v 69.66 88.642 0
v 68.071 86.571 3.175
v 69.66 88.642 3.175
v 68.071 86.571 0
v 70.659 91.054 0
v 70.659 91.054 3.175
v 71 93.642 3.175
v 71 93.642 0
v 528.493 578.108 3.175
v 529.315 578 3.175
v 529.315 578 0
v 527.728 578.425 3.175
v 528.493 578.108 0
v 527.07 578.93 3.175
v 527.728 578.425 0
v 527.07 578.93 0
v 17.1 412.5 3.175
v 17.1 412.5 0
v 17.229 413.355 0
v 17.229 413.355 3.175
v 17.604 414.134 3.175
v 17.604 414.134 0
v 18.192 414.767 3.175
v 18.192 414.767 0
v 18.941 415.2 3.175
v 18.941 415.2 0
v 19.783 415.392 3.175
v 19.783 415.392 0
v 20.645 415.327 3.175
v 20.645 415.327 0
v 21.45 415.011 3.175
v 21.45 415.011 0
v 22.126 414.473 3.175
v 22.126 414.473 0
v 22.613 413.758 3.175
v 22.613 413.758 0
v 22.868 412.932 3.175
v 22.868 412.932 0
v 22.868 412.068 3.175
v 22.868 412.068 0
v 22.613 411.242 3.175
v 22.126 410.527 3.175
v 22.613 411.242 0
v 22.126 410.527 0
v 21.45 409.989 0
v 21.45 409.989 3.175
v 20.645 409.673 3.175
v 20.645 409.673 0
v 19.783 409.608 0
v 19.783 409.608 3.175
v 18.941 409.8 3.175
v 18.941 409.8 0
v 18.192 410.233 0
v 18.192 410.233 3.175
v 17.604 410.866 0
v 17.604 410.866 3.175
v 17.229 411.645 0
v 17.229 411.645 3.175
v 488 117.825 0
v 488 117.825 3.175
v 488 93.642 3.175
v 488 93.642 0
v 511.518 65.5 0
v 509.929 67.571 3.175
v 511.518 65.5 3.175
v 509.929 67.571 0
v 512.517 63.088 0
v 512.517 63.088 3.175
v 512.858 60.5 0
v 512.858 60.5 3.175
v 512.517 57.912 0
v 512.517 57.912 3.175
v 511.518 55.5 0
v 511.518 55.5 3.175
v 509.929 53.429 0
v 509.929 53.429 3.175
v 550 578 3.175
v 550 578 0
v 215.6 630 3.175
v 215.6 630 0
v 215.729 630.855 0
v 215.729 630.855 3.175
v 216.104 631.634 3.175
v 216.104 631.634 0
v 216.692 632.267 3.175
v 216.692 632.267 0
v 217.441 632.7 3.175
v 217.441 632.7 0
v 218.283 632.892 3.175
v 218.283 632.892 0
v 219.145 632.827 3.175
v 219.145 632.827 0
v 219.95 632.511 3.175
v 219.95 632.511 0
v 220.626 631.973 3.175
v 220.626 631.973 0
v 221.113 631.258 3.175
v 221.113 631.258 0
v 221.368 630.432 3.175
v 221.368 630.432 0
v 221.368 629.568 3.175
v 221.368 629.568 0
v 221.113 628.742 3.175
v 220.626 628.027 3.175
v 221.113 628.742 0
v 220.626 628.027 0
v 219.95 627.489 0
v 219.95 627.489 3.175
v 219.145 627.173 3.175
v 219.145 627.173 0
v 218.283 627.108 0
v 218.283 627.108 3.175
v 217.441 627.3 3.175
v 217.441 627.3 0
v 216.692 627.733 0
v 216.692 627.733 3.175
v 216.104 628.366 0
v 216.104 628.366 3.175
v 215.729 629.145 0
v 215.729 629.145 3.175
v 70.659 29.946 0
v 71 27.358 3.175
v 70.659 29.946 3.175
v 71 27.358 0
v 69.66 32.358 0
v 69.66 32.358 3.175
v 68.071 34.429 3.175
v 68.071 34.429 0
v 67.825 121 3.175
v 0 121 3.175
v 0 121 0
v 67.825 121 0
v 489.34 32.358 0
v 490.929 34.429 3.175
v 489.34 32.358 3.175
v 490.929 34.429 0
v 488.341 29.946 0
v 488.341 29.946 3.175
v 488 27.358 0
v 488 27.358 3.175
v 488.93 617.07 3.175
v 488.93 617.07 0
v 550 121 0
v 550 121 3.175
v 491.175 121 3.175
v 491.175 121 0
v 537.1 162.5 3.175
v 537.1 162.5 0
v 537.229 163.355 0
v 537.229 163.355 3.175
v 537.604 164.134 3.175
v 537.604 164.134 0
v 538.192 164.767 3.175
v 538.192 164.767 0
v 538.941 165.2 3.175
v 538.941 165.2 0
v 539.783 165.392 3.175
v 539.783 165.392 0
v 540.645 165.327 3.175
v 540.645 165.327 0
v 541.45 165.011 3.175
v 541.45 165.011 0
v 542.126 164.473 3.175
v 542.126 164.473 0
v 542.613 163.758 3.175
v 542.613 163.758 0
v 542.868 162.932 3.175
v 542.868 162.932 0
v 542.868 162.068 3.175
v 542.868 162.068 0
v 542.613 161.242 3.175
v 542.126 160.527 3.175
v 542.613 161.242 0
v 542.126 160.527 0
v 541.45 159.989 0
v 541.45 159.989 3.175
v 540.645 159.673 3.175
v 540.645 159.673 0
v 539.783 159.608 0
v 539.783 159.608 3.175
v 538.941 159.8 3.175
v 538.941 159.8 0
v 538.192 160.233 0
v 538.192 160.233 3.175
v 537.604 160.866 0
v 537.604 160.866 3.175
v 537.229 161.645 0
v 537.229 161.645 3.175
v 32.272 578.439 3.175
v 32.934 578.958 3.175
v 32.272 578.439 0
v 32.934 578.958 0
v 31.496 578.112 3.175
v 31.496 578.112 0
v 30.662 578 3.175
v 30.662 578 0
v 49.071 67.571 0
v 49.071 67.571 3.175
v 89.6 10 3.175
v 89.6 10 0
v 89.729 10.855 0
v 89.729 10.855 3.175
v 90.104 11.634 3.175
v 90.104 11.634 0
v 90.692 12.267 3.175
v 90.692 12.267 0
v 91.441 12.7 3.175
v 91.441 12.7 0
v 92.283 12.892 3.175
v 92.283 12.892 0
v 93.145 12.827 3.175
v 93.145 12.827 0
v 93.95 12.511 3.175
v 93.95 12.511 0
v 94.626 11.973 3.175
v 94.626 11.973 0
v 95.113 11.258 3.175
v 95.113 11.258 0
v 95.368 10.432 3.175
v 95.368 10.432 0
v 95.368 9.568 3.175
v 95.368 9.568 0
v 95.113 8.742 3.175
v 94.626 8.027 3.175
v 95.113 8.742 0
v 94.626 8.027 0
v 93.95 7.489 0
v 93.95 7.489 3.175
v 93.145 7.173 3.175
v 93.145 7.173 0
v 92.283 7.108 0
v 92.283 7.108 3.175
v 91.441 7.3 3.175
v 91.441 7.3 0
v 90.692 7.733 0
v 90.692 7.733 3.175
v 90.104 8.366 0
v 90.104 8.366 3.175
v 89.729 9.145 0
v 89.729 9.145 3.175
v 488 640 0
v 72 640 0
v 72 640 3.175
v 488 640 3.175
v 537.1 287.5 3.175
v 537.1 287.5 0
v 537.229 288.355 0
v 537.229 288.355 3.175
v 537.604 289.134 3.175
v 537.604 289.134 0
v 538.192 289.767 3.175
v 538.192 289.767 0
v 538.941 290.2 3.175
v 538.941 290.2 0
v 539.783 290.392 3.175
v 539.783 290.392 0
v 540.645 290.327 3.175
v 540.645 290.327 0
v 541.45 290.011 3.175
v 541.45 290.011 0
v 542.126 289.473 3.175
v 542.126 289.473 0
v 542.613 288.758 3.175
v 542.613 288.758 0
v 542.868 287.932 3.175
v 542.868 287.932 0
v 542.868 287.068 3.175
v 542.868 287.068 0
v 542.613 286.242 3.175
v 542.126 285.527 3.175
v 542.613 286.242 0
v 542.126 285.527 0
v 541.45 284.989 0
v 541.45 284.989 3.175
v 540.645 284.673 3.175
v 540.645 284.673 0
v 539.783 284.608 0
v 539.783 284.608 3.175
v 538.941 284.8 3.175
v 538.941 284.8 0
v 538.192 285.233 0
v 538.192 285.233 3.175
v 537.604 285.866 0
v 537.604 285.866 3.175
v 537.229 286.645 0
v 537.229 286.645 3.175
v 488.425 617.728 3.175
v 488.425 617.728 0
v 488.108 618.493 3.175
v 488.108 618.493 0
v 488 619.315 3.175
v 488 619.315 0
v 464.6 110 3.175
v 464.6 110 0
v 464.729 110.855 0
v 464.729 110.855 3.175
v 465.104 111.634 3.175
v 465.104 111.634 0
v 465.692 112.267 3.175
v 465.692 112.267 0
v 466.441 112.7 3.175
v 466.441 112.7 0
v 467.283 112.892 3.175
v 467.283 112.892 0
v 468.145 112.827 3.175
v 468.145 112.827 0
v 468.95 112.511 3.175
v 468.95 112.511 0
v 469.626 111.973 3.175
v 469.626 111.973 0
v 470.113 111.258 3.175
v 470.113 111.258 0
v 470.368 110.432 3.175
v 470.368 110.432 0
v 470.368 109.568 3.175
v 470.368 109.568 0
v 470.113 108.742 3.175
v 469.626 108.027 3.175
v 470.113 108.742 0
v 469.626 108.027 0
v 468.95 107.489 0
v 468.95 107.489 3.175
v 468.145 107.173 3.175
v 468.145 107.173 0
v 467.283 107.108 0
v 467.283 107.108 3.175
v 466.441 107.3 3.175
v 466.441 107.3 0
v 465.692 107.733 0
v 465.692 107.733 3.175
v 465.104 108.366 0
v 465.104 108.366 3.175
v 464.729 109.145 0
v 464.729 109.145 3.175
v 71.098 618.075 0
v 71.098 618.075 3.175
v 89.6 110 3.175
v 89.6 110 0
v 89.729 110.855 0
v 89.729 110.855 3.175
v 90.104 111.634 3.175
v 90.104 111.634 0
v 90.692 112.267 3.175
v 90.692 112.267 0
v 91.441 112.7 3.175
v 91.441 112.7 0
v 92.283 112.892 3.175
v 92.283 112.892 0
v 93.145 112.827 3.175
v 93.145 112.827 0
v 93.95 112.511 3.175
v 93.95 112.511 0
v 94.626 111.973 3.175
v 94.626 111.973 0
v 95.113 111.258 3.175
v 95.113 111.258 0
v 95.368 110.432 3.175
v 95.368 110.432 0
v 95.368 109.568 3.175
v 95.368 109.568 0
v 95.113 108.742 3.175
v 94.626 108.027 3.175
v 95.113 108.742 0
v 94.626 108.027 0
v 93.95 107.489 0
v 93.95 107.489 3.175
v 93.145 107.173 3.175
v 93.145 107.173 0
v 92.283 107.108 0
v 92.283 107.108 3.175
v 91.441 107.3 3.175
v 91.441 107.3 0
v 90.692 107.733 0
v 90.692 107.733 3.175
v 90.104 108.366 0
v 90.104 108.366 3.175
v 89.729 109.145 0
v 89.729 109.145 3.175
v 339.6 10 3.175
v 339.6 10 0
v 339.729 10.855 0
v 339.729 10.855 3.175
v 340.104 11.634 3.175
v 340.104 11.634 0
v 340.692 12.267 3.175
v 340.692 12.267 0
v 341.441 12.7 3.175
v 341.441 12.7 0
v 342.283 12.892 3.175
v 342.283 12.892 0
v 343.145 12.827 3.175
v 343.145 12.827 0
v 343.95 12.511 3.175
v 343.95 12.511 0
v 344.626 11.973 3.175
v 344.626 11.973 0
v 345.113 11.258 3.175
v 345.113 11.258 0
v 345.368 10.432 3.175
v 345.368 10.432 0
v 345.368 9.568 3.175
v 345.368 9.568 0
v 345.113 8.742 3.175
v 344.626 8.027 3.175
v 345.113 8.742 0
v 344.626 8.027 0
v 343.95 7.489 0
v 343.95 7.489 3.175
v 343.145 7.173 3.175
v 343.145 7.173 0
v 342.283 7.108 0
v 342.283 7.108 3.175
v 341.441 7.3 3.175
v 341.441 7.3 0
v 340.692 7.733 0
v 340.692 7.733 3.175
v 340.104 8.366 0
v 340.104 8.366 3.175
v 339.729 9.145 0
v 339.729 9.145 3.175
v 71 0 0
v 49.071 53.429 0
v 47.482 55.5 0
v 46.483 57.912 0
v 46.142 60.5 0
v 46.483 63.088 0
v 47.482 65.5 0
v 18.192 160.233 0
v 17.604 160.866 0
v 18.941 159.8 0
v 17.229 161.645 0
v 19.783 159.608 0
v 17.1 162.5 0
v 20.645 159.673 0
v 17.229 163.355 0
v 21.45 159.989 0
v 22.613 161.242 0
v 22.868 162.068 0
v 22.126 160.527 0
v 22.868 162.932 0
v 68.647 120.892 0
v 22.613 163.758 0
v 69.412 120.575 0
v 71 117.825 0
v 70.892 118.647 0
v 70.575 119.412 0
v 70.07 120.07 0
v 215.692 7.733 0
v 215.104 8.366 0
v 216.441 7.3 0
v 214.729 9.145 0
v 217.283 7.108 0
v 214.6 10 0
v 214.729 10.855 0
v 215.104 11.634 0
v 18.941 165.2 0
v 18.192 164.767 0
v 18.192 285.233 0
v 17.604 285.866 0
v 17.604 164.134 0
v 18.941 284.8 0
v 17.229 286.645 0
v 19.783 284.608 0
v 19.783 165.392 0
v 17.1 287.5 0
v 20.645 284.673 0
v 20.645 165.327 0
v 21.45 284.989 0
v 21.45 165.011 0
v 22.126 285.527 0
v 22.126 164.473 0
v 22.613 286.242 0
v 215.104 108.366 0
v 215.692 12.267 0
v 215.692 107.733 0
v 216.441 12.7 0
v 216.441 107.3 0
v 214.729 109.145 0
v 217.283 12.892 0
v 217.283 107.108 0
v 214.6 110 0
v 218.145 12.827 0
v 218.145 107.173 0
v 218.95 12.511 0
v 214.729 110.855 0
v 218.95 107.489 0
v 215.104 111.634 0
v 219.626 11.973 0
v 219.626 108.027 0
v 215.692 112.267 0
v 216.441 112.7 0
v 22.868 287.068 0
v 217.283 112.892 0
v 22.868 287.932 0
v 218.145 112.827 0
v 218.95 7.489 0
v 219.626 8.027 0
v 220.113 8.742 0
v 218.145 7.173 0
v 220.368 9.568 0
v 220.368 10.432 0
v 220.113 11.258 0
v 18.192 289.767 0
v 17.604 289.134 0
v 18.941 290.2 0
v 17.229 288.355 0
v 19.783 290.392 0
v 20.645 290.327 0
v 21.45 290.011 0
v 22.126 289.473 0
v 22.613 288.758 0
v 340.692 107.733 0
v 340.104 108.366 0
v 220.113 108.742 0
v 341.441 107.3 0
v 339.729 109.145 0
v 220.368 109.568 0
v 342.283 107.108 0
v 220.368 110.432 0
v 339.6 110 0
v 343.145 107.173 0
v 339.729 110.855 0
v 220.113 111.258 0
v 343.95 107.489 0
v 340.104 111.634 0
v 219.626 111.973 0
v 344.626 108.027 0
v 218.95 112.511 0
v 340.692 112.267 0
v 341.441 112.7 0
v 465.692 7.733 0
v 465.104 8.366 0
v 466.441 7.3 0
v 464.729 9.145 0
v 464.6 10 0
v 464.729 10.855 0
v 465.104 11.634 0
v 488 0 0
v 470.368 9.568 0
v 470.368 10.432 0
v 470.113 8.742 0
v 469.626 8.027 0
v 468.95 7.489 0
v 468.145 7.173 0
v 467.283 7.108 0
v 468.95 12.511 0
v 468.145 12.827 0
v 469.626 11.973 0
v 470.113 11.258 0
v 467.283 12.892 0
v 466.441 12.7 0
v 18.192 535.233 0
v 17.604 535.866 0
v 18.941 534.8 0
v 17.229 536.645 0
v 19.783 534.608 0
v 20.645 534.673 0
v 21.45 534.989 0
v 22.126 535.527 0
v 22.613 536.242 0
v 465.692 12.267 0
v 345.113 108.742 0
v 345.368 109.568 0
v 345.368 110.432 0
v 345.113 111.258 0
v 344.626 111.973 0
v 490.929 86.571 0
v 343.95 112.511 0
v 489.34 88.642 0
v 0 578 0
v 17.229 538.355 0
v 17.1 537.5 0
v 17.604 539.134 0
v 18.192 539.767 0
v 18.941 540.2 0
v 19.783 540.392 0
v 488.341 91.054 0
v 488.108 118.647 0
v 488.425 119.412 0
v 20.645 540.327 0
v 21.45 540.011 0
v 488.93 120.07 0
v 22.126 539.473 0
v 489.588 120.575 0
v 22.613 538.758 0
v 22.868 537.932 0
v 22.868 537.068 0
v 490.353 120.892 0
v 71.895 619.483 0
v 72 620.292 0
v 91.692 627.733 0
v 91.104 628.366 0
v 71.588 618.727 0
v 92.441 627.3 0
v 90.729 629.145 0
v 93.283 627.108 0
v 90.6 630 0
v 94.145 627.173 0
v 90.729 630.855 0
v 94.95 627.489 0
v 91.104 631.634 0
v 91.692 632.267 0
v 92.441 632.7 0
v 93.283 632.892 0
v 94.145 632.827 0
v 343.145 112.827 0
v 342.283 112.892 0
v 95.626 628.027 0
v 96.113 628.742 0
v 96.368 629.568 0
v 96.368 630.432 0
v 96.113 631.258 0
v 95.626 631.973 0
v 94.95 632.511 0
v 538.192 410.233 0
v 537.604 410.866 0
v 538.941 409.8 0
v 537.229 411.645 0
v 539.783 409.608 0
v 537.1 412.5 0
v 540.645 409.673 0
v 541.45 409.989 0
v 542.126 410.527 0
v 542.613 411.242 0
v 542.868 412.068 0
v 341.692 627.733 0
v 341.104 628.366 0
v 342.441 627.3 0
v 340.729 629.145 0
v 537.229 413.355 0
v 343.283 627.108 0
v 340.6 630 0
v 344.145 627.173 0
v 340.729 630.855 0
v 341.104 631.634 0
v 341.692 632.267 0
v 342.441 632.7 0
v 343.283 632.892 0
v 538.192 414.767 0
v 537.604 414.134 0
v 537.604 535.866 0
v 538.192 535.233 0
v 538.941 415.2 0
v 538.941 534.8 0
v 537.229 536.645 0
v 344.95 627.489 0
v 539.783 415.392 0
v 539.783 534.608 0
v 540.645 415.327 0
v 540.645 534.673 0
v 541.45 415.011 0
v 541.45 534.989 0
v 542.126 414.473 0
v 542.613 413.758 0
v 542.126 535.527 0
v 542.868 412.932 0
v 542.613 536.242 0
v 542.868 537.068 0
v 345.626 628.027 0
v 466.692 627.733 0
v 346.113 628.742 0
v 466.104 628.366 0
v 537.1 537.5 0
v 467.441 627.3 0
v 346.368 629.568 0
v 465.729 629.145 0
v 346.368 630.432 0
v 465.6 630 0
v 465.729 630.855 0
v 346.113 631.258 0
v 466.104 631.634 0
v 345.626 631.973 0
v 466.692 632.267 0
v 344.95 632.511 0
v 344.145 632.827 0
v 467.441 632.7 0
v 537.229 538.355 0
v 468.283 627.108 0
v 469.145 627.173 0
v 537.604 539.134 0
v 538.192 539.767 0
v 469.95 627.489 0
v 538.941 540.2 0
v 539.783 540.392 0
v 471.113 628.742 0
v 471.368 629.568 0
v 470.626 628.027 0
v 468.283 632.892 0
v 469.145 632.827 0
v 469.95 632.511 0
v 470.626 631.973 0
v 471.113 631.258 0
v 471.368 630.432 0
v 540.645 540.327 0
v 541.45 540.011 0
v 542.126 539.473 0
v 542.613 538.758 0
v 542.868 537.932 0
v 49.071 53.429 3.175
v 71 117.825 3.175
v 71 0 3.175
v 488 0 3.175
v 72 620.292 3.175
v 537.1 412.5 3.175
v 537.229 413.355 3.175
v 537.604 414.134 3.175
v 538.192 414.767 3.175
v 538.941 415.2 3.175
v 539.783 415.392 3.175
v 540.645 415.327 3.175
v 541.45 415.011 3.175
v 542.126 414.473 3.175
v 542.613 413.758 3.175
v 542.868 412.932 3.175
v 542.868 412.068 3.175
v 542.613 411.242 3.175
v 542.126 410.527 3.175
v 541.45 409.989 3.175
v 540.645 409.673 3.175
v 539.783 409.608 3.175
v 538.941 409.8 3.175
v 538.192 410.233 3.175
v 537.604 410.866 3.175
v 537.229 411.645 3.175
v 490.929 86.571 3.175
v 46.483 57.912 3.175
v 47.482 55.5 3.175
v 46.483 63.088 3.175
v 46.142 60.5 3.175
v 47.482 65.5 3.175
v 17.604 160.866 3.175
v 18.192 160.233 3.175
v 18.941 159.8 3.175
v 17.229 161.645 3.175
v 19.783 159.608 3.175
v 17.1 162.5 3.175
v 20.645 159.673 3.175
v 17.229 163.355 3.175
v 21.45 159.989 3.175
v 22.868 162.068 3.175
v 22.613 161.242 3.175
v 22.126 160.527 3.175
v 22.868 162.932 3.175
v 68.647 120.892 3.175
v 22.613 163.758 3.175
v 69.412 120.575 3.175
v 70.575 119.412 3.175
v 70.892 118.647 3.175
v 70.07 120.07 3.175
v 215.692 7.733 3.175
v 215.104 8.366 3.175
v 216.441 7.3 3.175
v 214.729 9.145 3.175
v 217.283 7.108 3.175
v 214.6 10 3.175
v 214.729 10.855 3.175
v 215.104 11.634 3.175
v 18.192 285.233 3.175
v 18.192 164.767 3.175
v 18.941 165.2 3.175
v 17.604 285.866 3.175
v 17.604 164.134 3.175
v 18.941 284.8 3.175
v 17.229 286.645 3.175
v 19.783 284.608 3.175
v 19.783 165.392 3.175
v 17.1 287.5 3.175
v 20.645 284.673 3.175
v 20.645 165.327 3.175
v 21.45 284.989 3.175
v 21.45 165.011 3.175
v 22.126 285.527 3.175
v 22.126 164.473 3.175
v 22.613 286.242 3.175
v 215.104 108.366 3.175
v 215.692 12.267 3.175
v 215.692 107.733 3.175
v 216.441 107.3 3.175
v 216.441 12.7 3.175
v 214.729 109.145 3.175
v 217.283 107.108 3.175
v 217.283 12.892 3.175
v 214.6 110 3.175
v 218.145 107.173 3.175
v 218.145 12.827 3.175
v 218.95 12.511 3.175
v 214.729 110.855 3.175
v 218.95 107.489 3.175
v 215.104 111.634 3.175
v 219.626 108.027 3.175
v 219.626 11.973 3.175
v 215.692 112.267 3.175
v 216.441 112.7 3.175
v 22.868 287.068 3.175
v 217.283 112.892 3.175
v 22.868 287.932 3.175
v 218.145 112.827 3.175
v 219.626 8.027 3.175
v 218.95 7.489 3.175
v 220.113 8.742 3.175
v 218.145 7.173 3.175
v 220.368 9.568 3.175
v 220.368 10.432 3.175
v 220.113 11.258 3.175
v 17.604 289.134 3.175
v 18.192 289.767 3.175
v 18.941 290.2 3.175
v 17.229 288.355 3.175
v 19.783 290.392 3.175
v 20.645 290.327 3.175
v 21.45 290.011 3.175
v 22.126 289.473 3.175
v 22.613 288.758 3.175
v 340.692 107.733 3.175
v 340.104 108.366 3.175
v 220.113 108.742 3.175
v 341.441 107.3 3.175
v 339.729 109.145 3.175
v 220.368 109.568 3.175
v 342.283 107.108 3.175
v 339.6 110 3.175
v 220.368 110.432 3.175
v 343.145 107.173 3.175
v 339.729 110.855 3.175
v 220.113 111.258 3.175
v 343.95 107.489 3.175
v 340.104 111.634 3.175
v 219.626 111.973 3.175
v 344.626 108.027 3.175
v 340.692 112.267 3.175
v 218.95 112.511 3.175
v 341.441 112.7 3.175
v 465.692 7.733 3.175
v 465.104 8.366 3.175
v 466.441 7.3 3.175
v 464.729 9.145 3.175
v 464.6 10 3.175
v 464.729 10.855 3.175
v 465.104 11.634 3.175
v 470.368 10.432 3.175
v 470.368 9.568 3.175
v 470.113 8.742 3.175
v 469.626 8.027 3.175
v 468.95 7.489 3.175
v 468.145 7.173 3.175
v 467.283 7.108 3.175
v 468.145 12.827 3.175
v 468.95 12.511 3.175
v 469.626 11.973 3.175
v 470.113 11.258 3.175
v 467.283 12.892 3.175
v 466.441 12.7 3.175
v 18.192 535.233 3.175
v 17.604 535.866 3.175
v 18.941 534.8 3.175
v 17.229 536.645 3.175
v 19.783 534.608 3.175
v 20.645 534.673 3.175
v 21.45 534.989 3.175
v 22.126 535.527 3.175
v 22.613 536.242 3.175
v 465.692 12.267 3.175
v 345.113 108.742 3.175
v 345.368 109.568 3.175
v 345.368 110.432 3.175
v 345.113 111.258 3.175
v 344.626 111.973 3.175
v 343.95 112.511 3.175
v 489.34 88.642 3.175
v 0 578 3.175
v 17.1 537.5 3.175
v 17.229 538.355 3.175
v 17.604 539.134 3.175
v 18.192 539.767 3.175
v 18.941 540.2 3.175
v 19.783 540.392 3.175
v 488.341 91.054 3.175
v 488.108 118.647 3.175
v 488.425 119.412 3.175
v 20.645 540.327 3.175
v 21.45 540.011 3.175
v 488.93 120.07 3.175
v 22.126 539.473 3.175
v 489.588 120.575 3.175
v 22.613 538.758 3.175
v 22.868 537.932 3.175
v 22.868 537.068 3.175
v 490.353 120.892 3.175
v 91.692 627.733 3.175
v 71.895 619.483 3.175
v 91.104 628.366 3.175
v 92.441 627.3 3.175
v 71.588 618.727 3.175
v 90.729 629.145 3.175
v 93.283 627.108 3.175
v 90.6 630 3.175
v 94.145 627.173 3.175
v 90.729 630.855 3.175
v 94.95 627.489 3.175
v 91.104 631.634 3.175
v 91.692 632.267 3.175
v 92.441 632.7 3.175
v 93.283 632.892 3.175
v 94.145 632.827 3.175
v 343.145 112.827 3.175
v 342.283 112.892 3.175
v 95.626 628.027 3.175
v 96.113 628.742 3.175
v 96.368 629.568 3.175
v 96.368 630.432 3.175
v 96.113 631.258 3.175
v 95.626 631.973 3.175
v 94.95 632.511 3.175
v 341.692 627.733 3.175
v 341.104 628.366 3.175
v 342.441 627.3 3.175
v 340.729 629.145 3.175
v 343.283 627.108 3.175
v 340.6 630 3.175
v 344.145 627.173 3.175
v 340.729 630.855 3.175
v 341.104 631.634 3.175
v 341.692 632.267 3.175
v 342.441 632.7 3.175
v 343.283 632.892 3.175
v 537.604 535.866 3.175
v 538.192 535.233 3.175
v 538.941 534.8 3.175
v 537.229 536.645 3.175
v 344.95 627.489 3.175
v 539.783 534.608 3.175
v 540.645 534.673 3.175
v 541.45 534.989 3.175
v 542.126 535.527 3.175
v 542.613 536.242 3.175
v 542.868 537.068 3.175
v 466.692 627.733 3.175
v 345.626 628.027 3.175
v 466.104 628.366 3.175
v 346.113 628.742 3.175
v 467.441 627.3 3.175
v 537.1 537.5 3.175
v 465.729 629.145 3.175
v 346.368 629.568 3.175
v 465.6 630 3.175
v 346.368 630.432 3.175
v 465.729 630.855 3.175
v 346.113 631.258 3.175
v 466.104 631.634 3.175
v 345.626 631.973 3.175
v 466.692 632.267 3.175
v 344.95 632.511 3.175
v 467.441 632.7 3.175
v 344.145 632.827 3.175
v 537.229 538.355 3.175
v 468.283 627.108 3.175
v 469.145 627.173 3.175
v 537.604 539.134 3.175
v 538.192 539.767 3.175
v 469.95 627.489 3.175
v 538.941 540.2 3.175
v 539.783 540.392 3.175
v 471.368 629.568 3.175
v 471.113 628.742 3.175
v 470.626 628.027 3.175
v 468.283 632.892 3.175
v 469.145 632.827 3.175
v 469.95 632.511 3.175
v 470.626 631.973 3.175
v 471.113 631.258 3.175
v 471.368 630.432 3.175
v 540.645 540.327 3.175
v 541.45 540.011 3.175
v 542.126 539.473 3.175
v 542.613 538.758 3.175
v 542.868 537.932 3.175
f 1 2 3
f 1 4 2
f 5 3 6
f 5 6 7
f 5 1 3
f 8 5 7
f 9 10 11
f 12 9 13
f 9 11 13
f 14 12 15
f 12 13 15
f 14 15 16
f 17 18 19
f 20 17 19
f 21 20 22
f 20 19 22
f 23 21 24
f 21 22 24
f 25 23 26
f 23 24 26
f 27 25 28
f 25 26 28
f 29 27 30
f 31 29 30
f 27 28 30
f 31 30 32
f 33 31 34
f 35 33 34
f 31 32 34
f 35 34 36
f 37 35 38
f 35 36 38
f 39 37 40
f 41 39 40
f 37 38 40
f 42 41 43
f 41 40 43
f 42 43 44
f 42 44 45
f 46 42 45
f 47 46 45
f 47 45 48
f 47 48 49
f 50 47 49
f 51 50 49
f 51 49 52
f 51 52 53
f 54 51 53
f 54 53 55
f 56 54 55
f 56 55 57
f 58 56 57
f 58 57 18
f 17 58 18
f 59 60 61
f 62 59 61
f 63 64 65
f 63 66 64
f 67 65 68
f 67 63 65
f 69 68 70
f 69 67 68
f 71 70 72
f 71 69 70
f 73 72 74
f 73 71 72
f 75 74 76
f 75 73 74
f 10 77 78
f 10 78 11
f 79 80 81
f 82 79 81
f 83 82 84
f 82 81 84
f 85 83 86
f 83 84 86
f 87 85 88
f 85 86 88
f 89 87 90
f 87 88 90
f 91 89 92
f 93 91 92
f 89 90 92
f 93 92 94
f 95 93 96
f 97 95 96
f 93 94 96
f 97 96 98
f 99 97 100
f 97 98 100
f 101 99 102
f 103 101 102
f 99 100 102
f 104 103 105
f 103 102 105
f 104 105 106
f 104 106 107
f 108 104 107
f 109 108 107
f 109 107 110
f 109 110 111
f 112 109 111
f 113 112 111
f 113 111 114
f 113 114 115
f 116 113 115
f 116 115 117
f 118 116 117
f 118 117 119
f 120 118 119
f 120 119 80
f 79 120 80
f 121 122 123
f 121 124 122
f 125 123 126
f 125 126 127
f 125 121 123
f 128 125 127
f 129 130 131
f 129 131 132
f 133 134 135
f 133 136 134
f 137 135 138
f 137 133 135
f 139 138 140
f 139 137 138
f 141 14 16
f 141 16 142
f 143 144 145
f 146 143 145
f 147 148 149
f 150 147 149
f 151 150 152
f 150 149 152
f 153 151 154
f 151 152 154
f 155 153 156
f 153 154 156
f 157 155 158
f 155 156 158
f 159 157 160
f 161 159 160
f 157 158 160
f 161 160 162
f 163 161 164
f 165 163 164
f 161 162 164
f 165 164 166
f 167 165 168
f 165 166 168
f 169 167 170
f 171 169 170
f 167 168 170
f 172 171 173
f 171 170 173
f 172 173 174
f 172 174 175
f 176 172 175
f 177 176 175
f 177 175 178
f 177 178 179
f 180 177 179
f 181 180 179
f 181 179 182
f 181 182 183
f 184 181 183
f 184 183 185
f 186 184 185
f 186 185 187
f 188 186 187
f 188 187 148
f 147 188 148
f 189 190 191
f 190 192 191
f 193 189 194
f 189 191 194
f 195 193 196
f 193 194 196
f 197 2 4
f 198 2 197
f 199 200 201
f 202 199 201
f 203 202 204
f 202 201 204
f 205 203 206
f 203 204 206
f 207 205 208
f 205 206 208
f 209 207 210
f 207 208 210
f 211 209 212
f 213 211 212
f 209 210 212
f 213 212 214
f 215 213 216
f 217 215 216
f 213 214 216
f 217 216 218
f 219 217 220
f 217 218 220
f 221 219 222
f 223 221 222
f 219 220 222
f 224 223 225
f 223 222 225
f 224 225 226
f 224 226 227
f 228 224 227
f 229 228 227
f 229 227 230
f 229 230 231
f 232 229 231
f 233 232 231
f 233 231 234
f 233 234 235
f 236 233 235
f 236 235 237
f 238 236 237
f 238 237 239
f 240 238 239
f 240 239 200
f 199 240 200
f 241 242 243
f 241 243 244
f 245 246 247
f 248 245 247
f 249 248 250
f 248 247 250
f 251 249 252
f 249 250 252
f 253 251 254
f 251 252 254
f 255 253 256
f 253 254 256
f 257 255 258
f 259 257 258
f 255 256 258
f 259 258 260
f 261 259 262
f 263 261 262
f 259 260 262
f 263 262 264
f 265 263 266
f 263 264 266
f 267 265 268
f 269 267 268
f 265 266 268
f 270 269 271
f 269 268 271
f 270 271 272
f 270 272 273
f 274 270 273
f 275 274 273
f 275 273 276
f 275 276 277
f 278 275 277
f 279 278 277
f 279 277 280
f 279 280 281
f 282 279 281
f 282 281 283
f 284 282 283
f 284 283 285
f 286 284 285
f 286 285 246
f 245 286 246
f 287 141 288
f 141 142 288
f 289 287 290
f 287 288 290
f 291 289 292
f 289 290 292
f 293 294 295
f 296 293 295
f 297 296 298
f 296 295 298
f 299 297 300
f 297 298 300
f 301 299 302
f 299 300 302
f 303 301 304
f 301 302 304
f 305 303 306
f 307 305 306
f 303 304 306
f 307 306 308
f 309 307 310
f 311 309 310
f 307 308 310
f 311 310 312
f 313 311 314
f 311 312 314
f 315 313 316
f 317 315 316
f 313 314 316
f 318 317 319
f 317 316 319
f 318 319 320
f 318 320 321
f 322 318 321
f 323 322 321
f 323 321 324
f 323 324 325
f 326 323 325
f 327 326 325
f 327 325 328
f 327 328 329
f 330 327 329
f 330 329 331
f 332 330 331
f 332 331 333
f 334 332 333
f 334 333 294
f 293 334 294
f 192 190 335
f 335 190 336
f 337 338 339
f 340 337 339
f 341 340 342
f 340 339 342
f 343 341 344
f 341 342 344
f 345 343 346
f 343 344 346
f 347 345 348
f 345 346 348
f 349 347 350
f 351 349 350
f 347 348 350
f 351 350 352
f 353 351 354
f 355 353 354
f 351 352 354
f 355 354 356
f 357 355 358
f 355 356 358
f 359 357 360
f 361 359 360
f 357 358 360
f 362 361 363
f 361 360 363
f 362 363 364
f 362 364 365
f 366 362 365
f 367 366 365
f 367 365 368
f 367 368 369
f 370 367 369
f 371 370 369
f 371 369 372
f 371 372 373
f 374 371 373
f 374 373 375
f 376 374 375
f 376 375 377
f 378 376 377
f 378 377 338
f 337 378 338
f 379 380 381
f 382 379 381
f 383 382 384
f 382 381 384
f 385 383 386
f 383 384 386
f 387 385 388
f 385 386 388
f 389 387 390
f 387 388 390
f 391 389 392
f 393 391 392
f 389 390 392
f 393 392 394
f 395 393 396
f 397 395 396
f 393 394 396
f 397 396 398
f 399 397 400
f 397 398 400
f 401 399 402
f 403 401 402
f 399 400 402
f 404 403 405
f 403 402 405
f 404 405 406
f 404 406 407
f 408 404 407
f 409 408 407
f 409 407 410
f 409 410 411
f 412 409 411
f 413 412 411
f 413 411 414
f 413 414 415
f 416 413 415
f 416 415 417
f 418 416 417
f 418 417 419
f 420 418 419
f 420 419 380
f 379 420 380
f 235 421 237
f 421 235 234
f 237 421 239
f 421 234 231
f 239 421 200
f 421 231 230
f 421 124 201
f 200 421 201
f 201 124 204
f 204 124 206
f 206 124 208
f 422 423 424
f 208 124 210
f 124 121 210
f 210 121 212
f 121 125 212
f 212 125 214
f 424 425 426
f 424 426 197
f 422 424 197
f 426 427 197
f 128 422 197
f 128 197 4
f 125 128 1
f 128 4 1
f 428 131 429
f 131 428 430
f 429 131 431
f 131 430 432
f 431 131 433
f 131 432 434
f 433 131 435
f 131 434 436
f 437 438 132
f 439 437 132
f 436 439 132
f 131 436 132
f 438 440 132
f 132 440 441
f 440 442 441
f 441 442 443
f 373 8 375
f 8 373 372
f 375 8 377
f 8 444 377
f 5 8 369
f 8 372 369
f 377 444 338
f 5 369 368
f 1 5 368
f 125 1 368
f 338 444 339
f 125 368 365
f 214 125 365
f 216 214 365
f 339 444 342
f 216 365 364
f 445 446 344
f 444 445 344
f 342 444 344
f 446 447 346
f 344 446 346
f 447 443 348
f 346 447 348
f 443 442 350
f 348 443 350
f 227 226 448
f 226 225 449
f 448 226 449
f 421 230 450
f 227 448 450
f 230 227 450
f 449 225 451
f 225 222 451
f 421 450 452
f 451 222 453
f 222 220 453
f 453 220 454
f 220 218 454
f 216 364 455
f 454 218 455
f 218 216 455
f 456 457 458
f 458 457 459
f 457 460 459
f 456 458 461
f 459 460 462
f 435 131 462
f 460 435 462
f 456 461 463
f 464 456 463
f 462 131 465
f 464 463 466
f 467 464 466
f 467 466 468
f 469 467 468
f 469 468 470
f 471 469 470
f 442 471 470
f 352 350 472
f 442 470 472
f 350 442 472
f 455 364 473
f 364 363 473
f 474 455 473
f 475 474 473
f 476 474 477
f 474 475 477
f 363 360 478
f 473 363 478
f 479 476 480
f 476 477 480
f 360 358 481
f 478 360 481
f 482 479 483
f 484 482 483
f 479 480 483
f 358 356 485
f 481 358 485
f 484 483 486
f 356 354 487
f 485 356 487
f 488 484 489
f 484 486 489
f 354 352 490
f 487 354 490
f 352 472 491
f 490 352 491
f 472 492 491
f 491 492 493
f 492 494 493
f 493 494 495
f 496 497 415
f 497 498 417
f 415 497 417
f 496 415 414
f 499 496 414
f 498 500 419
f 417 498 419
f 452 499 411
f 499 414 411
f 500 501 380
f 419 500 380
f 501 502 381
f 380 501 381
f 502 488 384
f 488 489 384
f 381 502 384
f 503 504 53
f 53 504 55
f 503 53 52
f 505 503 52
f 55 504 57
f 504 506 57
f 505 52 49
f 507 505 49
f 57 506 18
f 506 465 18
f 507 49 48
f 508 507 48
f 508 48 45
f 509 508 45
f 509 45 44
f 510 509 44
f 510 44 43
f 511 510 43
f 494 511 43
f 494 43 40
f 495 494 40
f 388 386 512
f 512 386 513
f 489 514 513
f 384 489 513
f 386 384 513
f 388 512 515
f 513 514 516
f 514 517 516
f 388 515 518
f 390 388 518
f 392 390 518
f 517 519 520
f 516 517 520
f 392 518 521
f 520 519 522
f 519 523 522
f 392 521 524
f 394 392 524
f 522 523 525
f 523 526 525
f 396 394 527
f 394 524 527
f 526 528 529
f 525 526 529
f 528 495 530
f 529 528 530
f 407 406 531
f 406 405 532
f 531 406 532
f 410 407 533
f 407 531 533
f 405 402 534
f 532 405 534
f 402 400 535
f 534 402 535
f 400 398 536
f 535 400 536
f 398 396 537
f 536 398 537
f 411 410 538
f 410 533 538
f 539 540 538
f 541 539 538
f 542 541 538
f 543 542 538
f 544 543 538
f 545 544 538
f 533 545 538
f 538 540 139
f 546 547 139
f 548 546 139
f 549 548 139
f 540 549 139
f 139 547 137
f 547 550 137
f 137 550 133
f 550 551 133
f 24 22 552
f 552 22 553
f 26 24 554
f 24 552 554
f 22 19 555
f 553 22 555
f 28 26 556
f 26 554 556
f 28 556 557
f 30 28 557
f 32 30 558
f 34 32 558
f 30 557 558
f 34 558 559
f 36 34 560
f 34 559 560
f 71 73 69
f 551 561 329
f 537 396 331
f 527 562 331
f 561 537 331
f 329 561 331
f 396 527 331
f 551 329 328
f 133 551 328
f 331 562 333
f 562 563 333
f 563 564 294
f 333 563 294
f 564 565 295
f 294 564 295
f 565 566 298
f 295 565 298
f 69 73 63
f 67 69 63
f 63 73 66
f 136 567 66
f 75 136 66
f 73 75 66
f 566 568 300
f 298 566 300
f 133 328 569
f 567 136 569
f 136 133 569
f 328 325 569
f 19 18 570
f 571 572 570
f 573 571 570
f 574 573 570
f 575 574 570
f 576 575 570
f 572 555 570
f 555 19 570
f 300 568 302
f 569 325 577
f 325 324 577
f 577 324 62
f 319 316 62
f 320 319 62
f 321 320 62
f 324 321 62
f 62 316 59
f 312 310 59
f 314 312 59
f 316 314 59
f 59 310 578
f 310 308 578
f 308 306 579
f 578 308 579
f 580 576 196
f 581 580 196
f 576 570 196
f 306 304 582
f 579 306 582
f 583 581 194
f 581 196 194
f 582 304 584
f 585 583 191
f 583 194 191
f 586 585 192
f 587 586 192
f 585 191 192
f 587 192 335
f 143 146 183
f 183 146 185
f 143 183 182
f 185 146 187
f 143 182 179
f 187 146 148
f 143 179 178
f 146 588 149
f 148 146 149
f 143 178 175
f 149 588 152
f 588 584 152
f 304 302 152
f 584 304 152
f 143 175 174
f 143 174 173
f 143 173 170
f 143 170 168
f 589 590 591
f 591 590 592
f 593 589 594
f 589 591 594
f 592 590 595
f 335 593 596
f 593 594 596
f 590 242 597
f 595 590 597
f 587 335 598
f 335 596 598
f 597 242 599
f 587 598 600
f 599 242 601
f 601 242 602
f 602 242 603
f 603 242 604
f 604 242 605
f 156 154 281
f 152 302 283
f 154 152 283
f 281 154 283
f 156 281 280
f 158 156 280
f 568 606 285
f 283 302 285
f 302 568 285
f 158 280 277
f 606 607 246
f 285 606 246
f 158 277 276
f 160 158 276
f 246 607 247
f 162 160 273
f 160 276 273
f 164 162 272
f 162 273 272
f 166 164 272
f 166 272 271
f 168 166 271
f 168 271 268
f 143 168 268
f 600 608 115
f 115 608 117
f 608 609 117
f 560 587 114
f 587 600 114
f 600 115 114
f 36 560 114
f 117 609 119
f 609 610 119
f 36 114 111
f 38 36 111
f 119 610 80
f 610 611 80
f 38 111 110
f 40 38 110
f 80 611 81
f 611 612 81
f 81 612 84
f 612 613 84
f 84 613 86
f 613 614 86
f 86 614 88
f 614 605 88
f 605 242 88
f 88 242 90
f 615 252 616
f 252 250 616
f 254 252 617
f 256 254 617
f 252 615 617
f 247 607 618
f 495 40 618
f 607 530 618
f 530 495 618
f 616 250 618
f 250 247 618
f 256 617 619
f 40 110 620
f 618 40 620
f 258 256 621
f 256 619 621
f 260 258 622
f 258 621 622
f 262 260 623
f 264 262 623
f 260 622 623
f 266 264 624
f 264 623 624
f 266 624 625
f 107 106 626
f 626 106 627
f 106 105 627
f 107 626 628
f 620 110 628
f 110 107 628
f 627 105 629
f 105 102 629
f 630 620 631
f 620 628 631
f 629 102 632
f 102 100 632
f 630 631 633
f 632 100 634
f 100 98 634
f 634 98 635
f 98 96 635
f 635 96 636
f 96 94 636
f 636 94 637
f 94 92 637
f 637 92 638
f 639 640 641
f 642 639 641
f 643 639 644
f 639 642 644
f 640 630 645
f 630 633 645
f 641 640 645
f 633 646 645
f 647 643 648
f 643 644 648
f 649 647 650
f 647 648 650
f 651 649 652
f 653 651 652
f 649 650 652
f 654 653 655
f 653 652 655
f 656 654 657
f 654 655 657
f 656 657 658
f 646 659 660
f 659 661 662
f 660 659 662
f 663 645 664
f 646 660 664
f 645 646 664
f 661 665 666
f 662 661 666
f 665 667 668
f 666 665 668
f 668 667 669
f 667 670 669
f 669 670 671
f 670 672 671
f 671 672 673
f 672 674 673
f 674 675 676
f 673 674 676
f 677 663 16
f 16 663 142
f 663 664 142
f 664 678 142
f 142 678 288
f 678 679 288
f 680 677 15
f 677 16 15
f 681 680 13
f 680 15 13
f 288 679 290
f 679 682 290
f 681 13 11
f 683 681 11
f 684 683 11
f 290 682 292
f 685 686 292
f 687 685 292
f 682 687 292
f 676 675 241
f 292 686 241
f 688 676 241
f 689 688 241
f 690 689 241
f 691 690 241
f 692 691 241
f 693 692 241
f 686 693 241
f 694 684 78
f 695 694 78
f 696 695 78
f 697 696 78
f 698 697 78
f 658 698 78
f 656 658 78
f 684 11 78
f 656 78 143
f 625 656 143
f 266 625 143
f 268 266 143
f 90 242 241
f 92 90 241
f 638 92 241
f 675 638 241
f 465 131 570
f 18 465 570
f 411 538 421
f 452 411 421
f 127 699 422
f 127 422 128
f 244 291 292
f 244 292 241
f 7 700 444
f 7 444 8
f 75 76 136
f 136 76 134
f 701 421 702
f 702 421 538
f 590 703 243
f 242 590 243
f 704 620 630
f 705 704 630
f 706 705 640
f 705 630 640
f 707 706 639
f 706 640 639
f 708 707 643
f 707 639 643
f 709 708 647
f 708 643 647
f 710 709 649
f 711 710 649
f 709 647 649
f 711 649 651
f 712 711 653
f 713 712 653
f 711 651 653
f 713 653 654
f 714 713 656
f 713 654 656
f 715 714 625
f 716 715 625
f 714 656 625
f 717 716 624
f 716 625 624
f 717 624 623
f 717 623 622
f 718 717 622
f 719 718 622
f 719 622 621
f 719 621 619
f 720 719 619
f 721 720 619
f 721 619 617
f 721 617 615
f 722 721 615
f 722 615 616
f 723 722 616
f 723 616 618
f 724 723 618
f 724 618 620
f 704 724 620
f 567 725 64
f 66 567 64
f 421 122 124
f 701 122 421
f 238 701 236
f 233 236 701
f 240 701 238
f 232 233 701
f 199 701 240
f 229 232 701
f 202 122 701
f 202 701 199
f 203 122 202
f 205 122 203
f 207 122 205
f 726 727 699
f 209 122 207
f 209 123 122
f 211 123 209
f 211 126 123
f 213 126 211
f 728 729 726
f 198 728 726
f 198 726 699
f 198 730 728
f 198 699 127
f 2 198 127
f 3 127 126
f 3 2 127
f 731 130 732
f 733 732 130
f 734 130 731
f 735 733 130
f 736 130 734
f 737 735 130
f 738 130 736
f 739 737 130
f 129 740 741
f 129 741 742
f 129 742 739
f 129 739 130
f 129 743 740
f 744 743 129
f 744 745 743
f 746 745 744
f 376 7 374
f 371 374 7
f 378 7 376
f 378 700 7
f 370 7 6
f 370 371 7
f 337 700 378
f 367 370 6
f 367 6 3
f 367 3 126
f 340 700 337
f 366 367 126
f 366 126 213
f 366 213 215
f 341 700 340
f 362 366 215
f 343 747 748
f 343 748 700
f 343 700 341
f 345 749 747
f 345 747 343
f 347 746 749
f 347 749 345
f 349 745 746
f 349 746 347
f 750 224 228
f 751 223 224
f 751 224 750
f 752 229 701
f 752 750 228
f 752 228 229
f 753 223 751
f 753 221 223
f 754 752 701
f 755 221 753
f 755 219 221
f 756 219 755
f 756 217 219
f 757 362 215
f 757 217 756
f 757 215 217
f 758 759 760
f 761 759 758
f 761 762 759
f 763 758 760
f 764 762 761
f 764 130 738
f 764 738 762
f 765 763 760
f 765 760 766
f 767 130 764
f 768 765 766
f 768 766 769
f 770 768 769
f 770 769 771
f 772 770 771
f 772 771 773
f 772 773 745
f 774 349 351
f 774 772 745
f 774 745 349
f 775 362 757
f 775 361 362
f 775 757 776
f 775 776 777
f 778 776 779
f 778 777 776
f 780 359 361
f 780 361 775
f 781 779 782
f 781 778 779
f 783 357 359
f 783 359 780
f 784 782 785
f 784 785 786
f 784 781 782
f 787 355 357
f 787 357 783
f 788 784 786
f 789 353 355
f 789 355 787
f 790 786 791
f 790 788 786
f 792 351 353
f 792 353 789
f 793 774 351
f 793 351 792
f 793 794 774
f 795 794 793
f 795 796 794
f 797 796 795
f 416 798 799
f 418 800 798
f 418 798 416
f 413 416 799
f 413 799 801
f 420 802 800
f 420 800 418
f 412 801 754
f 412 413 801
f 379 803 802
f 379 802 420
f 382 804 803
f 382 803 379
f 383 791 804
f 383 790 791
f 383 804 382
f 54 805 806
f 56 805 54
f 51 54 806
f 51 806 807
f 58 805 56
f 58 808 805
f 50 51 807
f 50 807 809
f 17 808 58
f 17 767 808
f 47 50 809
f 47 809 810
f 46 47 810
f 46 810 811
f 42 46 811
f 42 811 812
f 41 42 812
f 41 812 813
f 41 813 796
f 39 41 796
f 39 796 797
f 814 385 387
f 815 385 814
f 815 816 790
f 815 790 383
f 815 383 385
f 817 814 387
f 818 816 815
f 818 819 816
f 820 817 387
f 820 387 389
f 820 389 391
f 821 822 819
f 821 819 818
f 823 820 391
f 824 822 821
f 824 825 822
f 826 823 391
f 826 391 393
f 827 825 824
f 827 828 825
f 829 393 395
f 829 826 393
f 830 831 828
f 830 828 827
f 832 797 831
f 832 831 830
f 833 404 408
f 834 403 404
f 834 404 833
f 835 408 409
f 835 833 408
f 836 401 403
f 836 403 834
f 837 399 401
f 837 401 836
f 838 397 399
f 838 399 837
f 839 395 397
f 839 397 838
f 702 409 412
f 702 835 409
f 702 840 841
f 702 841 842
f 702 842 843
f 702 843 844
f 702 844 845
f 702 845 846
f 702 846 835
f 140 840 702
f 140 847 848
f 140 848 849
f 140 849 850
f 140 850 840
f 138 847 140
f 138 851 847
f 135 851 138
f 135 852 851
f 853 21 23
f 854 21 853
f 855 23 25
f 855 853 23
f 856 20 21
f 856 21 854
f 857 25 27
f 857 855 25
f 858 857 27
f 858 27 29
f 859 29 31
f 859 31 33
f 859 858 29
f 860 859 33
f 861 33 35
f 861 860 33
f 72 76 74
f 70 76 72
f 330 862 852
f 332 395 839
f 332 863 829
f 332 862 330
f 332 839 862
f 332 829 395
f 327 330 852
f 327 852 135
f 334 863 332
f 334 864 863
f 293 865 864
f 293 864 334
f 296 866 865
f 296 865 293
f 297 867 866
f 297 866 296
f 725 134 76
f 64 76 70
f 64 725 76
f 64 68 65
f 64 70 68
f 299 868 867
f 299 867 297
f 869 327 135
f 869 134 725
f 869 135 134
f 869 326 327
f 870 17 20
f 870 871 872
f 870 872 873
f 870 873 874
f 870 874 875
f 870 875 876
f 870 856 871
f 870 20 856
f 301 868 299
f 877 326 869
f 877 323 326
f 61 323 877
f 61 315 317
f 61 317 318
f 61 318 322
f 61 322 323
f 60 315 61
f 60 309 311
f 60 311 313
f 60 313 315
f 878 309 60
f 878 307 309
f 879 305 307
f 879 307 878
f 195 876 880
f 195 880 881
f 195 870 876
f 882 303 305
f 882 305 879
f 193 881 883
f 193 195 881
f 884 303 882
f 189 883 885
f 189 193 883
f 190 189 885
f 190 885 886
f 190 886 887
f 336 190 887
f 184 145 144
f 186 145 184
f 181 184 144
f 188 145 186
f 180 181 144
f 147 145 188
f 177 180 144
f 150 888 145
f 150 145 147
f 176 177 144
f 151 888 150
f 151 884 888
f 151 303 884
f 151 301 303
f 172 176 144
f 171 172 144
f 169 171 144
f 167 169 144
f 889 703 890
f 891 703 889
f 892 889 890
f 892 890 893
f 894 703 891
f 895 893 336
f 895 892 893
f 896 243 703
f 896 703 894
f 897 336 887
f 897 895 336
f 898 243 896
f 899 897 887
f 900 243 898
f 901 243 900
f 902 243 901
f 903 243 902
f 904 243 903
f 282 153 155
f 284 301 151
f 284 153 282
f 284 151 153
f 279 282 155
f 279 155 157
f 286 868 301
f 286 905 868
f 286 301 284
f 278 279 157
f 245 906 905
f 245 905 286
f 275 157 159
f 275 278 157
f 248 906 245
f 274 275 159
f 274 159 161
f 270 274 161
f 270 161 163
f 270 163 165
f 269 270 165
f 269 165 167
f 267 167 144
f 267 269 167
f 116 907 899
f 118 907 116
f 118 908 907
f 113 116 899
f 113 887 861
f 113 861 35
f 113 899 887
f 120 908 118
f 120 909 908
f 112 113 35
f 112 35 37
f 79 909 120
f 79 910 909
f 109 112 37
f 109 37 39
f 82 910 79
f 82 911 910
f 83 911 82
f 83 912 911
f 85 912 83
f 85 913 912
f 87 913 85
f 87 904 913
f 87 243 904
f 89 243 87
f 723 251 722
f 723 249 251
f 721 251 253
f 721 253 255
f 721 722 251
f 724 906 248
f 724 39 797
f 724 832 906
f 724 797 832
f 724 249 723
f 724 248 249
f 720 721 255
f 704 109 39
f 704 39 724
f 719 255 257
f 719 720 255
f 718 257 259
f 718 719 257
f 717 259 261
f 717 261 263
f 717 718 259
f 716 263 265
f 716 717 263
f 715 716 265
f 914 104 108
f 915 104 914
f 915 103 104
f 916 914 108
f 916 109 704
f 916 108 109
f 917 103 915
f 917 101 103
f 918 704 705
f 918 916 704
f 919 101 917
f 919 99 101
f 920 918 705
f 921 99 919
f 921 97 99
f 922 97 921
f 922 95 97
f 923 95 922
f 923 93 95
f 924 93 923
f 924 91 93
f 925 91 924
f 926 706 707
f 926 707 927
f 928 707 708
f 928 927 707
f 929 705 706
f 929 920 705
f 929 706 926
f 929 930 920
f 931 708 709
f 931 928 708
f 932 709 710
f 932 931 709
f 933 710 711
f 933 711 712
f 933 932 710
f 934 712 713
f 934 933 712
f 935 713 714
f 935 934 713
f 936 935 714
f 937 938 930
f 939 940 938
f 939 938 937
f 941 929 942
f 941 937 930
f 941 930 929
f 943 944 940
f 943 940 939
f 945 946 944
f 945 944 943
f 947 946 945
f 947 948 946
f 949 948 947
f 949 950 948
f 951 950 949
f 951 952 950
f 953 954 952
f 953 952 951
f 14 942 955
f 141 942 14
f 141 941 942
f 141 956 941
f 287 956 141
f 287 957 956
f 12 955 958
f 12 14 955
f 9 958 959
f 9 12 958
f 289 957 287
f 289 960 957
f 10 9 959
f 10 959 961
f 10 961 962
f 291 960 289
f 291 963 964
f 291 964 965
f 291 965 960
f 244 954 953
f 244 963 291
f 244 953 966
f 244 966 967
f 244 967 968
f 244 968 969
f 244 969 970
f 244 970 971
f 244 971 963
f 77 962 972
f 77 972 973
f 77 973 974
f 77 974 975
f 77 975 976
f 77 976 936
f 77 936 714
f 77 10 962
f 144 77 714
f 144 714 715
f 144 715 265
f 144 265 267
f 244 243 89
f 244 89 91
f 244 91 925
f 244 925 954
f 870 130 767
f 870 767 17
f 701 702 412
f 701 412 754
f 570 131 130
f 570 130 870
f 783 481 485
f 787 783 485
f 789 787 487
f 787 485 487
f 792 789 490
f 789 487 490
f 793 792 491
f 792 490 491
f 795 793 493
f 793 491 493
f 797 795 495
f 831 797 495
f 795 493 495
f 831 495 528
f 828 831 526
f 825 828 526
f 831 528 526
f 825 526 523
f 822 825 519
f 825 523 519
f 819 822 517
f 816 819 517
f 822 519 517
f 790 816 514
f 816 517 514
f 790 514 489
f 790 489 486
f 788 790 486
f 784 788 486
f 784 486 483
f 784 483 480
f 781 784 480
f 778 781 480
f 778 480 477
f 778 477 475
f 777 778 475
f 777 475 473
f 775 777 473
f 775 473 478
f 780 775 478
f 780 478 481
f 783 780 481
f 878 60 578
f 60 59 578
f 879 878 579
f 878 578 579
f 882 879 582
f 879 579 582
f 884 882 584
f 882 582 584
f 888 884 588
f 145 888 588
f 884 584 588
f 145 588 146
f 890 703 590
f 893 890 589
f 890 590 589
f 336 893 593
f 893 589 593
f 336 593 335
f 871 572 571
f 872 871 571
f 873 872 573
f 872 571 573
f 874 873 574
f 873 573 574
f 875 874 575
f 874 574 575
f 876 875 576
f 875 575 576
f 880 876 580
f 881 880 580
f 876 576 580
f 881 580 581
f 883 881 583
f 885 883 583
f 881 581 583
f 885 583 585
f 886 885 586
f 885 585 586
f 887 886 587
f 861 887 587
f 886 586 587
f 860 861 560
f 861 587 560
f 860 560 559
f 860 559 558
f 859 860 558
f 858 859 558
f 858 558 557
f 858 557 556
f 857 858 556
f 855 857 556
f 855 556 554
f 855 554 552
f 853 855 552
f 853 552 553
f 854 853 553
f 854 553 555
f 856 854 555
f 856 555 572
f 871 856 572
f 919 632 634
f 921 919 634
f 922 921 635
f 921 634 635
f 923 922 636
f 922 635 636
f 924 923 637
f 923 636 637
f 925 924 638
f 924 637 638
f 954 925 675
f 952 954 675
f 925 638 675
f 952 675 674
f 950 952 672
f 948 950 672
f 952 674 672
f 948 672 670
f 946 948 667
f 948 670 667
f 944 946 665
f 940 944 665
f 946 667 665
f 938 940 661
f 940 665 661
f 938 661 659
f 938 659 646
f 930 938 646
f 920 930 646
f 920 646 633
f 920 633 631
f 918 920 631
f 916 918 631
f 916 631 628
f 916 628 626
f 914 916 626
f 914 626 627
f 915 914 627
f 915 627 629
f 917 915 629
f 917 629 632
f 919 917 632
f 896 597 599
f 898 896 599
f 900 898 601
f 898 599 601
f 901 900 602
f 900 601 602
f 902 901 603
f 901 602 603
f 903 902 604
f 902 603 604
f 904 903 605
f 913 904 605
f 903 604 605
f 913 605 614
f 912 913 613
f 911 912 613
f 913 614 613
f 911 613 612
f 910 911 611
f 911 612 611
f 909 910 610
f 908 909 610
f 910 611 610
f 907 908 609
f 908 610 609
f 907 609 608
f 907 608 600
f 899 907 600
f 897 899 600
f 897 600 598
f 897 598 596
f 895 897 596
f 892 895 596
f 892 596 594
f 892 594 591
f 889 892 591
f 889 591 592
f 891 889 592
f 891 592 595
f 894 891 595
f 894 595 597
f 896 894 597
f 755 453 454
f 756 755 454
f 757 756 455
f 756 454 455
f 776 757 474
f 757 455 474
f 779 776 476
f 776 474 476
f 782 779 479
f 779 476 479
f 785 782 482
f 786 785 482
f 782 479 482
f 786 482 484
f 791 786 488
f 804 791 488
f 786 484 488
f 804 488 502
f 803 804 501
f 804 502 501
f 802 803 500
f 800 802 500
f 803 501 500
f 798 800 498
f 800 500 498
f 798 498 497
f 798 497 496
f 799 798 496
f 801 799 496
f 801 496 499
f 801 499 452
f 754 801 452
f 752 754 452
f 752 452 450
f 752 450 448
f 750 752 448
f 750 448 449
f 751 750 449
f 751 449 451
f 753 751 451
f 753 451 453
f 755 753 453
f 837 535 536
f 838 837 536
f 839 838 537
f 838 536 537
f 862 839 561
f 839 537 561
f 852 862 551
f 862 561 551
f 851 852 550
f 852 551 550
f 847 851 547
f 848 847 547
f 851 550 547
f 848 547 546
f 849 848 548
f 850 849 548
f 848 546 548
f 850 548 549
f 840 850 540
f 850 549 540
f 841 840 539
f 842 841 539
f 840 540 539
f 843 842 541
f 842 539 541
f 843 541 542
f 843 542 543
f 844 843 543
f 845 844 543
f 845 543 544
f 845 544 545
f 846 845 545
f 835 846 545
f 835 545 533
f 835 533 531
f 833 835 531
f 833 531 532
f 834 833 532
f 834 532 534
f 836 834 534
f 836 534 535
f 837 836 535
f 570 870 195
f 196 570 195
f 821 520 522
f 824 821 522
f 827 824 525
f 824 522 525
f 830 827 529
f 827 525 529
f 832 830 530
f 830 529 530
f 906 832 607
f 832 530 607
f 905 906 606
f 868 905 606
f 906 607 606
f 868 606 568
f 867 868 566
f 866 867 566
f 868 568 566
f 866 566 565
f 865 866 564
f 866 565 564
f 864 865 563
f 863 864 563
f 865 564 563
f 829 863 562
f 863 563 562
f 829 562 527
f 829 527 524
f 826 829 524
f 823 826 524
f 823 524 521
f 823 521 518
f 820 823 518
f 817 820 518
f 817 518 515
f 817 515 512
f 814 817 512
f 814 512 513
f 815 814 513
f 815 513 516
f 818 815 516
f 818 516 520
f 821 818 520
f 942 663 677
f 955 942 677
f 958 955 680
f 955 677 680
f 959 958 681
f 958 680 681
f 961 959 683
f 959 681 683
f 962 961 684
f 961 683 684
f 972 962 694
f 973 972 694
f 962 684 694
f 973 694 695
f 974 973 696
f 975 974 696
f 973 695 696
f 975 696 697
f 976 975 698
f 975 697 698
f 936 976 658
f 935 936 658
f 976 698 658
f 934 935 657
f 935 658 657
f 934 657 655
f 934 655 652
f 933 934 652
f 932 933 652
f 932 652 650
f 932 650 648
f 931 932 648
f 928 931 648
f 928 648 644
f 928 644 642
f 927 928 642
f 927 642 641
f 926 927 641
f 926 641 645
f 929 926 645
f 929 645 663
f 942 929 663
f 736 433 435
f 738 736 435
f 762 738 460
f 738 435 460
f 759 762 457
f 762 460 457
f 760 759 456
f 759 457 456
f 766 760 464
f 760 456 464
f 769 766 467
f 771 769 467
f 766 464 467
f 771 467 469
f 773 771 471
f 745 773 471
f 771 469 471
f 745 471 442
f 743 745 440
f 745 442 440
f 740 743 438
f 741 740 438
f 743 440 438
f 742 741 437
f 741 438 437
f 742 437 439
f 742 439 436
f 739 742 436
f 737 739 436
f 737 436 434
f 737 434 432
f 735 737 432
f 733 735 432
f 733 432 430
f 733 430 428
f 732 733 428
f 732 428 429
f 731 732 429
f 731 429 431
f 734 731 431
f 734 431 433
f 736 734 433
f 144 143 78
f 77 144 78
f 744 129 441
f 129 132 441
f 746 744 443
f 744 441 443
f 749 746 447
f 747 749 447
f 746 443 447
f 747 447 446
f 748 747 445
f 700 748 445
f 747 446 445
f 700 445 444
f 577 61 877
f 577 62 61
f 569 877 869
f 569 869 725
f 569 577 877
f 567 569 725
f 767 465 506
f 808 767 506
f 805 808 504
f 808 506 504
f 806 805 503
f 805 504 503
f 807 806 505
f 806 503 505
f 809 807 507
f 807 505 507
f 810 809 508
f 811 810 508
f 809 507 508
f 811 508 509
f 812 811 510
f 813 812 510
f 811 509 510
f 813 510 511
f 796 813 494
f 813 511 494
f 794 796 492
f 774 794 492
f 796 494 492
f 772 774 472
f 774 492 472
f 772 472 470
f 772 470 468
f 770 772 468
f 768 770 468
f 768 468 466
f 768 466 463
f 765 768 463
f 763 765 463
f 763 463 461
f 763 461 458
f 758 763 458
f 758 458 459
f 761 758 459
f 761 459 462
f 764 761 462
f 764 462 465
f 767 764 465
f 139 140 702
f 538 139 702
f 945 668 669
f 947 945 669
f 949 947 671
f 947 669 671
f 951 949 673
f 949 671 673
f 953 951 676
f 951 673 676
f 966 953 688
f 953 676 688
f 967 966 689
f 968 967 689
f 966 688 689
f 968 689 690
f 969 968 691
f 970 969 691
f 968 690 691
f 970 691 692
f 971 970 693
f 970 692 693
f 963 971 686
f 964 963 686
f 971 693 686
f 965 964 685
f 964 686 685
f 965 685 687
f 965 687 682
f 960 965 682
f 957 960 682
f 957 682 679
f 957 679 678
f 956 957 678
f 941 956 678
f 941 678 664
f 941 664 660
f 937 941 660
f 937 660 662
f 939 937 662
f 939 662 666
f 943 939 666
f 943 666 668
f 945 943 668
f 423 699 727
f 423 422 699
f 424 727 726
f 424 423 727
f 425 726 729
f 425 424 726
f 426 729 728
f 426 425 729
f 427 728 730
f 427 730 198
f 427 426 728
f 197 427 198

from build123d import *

# Parameters (mm, degrees)
SKETCH2_W            = 550
SKETCH2_H            = 640
BOSS_EXTRUDE1_DEPTH  = 3.175
CUT_EXTRUDE1_DEPTH   = 844.866150894
FILLET1_R            = 10
FILLET2_R            = 3.175
M5_CLEARANCE_HOLE1_D = 5.8
LPATTERN1_COUNT      = 4
LPATTERN1_PITCH      = 125
M5_CLEARANCE_HOLE2_D = 5.8
LPATTERN2_COUNT      = 4
LPATTERN2_PITCH      = 125
M5_CLEARANCE_HOLE3_D = 5.8
LPATTERN3_COUNT      = 4
LPATTERN3_PITCH      = 125


with BuildPart() as part:
    # Sketch2 → Boss-Extrude1 (new body)
    with BuildSketch(Plane.XY):
        with Locations((275, 320)):
            Rectangle(SKETCH2_W, SKETCH2_H)
    extrude(amount=BOSS_EXTRUDE1_DEPTH)

    # Sketch3 → Cut-Extrude1 (cut, through all)
    with BuildSketch(Plane.XY.offset(3.175)):
        Polygon((0, 640), (0, 578), (32, 578), (72, 619), (72, 640), align=None)
        Polygon((488, 618), (488, 640), (550, 640), (550, 578), (528, 578), align=None)
        Polygon((0, 121), (71, 121), (71, 89.5), (42, 60.5), (71, 31.5), (71, 0), (0, 0), align=None)
        Polygon((550, 0), (550, 121), (488, 121), (488, 89.5), (517, 60.5), (488, 31.5), (488, 0), align=None)
    extrude(amount=-CUT_EXTRUDE1_DEPTH, mode=Mode.SUBTRACT)

    # Fillet1
    fillet1_edges = [part.edges().sort_by_distance(p)[0] for p in [
        (71, 89.5, 1.5875),
        (42, 60.5, 1.5875),
        (71, 31.5, 1.5875),
        (488, 31.5, 1.5875),
        (517, 60.5, 1.5875),
        (488, 89.5, 1.5875),
    ]]
    fillet(fillet1_edges, radius=FILLET1_R)

    # Fillet2
    fillet2_edges = [part.edges().sort_by_distance(p)[0] for p in [
        (72, 619, 1.5875),
        (32, 578, 1.5875),
        (528, 578, 1.5875),
        (488, 618, 1.5875),
        (71, 121, 1.5875),
        (488, 121, 1.5875),
    ]]
    fillet(fillet2_edges, radius=FILLET2_R)

    # M5 Clearance Hole1 (through all)
    with Locations(Plane(origin=(93.5, 630, 3.175), x_dir=(1, 0, 0), z_dir=(0, 0, 1))):
        with Locations((0, 0)):
            m5_clearance_hole1 = Hole(M5_CLEARANCE_HOLE1_D / 2)

    # LPattern1: M5 Clearance Hole1 ×4
    with Locations(*[(i * LPATTERN1_PITCH, 0, 0) for i in range(1, LPATTERN1_COUNT)]):
        add(m5_clearance_hole1, mode=Mode.SUBTRACT)

    # M5 Clearance Hole2 (through all)
    with Locations(Plane(origin=(20, 162.5, 3.175), x_dir=(1, 0, 0), z_dir=(0, 0, 1))):
        with Locations((0, 0), (520, 0)):
            m5_clearance_hole2 = Hole(M5_CLEARANCE_HOLE2_D / 2)

    # LPattern2: M5 Clearance Hole2 ×4
    with Locations(*[(0, i * LPATTERN2_PITCH, 0) for i in range(1, LPATTERN2_COUNT)]):
        add(m5_clearance_hole2, mode=Mode.SUBTRACT)

    # M5 Clearance Hole3 (through all)
    with Locations(Plane(origin=(92.5, 110, 3.175), x_dir=(1, 0, 0), z_dir=(0, 0, 1))):
        with Locations((0, 0), (0, -100)):
            m5_clearance_hole3 = Hole(M5_CLEARANCE_HOLE3_D / 2)

    # LPattern3: M5 Clearance Hole3 ×4
    with Locations(*[(i * LPATTERN3_PITCH, 0, 0) for i in range(1, LPATTERN3_COUNT)]):
        add(m5_clearance_hole3, mode=Mode.SUBTRACT)


solid = part.part
